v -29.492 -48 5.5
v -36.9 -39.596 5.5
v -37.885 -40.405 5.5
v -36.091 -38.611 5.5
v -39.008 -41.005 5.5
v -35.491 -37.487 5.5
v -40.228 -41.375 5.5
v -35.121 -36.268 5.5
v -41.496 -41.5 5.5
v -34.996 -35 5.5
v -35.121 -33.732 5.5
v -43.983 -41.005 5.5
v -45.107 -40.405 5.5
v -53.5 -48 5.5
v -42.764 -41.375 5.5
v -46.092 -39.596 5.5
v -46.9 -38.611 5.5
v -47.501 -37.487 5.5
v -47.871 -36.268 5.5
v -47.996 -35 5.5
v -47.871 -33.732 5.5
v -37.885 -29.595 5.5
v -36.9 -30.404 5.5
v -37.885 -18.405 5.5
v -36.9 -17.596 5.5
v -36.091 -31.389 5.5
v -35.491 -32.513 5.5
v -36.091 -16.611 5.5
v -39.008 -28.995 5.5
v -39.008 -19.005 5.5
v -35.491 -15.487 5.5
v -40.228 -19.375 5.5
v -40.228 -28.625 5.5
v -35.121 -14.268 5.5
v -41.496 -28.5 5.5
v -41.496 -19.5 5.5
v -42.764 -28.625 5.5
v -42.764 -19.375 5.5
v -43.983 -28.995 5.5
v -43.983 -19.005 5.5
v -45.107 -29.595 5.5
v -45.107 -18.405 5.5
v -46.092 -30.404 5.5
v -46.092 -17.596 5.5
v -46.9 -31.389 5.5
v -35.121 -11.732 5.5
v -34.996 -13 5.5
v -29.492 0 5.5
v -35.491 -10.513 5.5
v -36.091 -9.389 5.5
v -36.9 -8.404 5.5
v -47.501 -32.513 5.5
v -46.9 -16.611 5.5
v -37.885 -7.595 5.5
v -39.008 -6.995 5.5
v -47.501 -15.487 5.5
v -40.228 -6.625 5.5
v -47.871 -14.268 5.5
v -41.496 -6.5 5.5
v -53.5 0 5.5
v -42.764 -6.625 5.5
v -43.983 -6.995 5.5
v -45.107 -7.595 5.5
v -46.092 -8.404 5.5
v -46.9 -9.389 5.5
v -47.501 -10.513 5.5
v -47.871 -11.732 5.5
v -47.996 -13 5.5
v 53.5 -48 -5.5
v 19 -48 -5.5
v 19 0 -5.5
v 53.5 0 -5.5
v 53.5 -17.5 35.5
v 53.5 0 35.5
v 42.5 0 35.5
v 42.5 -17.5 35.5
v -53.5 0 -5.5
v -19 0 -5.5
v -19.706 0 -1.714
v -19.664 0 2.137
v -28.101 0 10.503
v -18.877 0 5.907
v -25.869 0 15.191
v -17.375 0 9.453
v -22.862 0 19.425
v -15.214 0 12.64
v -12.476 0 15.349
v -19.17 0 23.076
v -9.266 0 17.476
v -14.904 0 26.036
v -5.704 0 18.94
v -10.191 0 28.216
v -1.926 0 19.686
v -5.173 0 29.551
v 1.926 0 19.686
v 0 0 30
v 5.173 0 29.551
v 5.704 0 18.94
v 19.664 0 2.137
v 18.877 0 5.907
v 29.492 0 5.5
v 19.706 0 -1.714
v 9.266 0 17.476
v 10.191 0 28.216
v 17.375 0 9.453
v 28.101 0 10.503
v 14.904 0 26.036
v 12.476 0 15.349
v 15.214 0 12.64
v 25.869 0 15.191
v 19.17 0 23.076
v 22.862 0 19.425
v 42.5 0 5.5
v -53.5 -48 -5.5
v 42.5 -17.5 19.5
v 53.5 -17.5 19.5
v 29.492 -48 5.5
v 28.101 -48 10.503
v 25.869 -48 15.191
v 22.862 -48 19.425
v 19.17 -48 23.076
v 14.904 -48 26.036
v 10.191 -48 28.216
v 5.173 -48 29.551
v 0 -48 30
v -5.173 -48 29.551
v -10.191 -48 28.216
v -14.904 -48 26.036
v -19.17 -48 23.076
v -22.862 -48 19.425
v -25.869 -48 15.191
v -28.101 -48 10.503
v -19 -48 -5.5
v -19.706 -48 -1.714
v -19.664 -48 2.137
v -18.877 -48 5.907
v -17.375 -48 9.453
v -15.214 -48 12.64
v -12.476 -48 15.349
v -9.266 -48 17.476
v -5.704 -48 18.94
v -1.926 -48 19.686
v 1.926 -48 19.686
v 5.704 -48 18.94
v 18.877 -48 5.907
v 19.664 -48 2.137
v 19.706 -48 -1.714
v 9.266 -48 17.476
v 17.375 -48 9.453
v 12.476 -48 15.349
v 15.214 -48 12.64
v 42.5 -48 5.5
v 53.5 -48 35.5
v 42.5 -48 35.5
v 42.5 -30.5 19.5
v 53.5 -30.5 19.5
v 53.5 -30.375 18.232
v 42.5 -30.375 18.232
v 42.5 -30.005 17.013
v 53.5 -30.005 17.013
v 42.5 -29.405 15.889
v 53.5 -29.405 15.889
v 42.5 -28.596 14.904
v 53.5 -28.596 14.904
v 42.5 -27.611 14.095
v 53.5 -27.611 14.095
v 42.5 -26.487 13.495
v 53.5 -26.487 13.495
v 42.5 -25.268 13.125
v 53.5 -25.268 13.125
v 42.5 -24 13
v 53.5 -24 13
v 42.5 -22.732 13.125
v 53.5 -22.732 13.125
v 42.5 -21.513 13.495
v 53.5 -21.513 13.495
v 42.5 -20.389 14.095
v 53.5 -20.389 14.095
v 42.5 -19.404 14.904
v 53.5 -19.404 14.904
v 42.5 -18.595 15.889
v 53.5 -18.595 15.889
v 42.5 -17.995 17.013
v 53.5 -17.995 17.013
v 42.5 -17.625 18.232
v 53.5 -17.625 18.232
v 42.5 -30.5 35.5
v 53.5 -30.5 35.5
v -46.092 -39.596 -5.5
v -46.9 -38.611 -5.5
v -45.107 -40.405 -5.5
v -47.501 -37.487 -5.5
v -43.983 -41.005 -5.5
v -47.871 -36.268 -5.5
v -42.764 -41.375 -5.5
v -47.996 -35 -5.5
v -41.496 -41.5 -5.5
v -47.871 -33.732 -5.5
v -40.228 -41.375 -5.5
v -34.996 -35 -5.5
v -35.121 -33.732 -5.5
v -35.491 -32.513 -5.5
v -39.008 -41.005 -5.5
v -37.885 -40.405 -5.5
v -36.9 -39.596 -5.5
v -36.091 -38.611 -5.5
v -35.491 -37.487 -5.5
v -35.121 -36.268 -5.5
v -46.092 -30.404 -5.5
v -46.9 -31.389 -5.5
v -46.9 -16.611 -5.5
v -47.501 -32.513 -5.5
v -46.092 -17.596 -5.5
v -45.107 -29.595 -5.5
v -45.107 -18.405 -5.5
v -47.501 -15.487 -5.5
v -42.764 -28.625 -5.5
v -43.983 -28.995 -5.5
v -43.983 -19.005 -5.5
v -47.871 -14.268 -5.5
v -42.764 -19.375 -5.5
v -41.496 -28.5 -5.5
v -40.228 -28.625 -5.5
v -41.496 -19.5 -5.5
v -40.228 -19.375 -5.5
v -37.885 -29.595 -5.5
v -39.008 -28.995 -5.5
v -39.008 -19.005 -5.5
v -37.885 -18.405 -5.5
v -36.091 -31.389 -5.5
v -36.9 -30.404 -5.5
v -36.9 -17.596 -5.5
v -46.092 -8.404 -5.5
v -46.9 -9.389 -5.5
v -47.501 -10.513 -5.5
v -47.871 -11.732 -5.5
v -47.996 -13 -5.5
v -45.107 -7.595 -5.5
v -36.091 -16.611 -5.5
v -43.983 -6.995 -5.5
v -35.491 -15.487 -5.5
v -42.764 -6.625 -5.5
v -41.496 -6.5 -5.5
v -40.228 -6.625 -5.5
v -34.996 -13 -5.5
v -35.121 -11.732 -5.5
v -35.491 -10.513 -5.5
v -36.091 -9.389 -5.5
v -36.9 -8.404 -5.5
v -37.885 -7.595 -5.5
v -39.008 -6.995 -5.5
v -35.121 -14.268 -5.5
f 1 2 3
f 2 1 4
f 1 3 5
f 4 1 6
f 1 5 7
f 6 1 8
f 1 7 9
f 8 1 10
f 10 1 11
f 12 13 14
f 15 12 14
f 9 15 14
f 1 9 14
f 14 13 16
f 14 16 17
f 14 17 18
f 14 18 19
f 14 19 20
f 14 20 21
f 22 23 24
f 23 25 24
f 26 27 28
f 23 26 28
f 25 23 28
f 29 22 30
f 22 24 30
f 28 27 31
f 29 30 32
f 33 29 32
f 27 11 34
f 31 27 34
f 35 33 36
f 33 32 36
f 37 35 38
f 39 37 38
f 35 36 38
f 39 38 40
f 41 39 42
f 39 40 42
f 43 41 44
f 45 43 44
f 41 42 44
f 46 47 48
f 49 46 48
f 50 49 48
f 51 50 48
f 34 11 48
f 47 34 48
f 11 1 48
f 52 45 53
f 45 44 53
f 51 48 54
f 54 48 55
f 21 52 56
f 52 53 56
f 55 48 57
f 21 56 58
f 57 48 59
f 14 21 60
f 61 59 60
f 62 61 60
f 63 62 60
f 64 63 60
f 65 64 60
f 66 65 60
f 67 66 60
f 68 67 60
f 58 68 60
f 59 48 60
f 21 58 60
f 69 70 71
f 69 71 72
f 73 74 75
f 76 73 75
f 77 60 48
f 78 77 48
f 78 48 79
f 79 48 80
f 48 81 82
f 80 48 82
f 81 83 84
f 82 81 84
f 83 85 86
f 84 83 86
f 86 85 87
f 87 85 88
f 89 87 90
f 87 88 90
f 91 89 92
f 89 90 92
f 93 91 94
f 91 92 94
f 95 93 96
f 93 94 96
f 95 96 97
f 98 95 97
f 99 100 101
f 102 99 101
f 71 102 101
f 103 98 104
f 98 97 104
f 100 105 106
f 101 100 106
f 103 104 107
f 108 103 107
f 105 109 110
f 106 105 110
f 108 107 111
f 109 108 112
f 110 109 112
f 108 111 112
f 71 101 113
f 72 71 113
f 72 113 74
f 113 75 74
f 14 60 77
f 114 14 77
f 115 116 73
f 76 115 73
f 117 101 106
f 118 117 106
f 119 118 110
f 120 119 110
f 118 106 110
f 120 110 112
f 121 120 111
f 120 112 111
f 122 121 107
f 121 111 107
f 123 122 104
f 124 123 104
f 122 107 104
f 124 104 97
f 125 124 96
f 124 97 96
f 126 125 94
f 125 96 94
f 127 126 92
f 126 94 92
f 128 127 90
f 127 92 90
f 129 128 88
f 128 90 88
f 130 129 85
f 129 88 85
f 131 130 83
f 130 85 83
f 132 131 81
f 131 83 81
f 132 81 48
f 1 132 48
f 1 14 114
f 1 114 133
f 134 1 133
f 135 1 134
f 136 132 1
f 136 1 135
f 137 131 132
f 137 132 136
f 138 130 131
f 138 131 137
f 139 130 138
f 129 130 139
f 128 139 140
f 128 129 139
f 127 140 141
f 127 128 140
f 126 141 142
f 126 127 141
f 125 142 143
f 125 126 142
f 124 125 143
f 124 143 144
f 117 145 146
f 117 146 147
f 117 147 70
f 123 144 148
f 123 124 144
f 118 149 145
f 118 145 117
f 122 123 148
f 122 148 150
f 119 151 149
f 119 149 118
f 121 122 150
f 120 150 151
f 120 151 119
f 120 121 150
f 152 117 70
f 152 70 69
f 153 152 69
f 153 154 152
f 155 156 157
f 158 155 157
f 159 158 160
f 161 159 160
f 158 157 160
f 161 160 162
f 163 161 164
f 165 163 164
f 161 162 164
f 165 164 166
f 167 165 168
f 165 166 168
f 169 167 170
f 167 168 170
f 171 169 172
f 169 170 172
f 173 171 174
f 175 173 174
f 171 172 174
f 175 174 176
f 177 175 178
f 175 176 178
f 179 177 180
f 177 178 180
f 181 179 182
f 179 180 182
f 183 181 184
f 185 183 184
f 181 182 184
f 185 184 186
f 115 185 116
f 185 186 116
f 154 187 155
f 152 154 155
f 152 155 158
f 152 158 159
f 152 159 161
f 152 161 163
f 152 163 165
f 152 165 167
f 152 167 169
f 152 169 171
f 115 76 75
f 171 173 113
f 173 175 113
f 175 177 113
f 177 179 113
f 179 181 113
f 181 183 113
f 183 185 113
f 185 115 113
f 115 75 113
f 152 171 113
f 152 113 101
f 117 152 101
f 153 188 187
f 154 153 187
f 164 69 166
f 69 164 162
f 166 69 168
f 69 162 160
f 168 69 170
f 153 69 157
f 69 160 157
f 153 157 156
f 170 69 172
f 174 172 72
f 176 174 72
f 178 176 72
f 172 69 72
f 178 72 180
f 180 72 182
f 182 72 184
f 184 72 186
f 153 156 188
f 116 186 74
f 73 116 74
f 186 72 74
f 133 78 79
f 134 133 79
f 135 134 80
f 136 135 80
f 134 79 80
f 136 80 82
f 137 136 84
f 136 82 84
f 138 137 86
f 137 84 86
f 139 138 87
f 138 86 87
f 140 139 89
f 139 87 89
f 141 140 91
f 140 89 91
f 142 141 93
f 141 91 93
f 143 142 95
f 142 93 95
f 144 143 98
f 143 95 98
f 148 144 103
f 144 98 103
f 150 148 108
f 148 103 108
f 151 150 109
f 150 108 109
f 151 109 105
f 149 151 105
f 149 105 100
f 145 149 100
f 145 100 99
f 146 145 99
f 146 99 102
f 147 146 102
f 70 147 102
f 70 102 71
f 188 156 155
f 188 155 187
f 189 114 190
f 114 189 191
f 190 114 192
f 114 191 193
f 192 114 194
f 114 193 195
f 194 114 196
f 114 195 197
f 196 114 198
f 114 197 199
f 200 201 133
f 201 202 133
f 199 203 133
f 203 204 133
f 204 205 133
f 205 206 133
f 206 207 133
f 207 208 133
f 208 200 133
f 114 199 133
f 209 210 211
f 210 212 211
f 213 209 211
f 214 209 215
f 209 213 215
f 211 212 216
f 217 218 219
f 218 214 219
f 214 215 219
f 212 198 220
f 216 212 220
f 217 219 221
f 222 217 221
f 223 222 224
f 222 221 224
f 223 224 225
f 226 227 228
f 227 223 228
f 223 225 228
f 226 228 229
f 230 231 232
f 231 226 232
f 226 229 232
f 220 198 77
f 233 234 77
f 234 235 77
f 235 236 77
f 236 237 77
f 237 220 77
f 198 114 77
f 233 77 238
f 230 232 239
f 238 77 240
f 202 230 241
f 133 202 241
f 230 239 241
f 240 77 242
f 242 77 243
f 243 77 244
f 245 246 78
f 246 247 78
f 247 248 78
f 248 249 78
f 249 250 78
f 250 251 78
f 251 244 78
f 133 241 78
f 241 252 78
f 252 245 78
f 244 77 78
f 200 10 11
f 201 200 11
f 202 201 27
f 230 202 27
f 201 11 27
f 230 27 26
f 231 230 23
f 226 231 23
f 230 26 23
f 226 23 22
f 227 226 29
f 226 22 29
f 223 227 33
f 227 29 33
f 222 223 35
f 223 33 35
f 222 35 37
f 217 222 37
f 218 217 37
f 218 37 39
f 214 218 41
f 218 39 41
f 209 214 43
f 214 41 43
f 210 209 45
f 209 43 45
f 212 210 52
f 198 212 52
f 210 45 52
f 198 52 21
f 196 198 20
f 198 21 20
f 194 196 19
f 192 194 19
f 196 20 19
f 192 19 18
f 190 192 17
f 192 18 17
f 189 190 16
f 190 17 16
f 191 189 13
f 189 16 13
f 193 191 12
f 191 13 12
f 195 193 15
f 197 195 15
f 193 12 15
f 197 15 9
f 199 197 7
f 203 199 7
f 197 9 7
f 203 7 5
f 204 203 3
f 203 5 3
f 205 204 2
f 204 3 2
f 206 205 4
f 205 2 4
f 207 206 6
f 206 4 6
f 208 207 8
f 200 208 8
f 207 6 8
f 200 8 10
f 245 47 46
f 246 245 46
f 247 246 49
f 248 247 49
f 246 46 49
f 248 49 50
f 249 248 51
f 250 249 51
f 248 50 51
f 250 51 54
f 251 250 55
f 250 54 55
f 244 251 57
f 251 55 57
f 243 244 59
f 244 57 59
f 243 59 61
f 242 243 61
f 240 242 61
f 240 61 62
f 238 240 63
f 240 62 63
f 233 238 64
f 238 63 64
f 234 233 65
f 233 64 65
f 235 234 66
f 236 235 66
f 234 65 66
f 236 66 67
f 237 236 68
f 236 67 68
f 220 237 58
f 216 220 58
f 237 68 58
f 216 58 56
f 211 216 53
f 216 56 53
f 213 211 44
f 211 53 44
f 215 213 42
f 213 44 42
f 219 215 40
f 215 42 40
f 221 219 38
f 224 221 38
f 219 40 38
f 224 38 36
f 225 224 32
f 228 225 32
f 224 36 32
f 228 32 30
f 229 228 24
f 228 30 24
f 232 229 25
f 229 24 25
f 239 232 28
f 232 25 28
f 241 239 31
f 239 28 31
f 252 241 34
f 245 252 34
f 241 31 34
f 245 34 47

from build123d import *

# Parameters (mm, degrees)
F1_DEPTH = 48
F2_R     = 6.5
F3_DEPTH = 11
F5_W     = 13
F5_H     = 16
F6_DEPTH = 12


with BuildPart() as f1:
    # F0 (on Front) → F1 (new body)
    with BuildSketch(Plane.XZ):
        with BuildLine():
            ThreePointArc((-19, -5.5), (0, 19.78004), (19, -5.5))
            Line((19, -5.5), (53.5, -5.5))
            Line((53.5, -5.5), (53.5, 5.5))
            Line((53.5, 5.5), (53.5, 35.5))
            Line((53.5, 35.5), (42.5, 35.5))
            Line((42.5, 35.5), (42.5, 5.5))
            Line((42.5, 5.5), (29.491524, 5.5))
            ThreePointArc((29.491524, 5.5), (0, 30), (-29.491524, 5.5))
            Line((-29.491524, 5.5), (-53.5, 5.5))
            Line((-53.5, 5.5), (-53.5, -5.5))
            Line((-53.5, -5.5), (-19, -5.5))
        make_face()
    extrude(amount=F1_DEPTH)

    # F2 (on face) → F3 (cut)
    with BuildSketch(Plane.XY.offset(5.5)):
        with Locations((-41.495762, -35)):
            Circle(F2_R)
        with Locations((-41.495762, -13)):
            Circle(F2_R)
    extrude(amount=-F3_DEPTH, mode=Mode.SUBTRACT)

    # F5 (on face) → F6 (cut)
    with BuildSketch(Plane.YZ.offset(53.5)):
        with BuildLine():
            Line((-17.5, 19.5), (-30.5, 19.5))
            ThreePointArc((-30.5, 19.5), (-24, 13), (-17.5, 19.5))
        make_face()
        with Locations((-24, 27.5)):
            Rectangle(F5_W, F5_H)
    extrude(amount=-F6_DEPTH, mode=Mode.SUBTRACT)


solid = f1.part
